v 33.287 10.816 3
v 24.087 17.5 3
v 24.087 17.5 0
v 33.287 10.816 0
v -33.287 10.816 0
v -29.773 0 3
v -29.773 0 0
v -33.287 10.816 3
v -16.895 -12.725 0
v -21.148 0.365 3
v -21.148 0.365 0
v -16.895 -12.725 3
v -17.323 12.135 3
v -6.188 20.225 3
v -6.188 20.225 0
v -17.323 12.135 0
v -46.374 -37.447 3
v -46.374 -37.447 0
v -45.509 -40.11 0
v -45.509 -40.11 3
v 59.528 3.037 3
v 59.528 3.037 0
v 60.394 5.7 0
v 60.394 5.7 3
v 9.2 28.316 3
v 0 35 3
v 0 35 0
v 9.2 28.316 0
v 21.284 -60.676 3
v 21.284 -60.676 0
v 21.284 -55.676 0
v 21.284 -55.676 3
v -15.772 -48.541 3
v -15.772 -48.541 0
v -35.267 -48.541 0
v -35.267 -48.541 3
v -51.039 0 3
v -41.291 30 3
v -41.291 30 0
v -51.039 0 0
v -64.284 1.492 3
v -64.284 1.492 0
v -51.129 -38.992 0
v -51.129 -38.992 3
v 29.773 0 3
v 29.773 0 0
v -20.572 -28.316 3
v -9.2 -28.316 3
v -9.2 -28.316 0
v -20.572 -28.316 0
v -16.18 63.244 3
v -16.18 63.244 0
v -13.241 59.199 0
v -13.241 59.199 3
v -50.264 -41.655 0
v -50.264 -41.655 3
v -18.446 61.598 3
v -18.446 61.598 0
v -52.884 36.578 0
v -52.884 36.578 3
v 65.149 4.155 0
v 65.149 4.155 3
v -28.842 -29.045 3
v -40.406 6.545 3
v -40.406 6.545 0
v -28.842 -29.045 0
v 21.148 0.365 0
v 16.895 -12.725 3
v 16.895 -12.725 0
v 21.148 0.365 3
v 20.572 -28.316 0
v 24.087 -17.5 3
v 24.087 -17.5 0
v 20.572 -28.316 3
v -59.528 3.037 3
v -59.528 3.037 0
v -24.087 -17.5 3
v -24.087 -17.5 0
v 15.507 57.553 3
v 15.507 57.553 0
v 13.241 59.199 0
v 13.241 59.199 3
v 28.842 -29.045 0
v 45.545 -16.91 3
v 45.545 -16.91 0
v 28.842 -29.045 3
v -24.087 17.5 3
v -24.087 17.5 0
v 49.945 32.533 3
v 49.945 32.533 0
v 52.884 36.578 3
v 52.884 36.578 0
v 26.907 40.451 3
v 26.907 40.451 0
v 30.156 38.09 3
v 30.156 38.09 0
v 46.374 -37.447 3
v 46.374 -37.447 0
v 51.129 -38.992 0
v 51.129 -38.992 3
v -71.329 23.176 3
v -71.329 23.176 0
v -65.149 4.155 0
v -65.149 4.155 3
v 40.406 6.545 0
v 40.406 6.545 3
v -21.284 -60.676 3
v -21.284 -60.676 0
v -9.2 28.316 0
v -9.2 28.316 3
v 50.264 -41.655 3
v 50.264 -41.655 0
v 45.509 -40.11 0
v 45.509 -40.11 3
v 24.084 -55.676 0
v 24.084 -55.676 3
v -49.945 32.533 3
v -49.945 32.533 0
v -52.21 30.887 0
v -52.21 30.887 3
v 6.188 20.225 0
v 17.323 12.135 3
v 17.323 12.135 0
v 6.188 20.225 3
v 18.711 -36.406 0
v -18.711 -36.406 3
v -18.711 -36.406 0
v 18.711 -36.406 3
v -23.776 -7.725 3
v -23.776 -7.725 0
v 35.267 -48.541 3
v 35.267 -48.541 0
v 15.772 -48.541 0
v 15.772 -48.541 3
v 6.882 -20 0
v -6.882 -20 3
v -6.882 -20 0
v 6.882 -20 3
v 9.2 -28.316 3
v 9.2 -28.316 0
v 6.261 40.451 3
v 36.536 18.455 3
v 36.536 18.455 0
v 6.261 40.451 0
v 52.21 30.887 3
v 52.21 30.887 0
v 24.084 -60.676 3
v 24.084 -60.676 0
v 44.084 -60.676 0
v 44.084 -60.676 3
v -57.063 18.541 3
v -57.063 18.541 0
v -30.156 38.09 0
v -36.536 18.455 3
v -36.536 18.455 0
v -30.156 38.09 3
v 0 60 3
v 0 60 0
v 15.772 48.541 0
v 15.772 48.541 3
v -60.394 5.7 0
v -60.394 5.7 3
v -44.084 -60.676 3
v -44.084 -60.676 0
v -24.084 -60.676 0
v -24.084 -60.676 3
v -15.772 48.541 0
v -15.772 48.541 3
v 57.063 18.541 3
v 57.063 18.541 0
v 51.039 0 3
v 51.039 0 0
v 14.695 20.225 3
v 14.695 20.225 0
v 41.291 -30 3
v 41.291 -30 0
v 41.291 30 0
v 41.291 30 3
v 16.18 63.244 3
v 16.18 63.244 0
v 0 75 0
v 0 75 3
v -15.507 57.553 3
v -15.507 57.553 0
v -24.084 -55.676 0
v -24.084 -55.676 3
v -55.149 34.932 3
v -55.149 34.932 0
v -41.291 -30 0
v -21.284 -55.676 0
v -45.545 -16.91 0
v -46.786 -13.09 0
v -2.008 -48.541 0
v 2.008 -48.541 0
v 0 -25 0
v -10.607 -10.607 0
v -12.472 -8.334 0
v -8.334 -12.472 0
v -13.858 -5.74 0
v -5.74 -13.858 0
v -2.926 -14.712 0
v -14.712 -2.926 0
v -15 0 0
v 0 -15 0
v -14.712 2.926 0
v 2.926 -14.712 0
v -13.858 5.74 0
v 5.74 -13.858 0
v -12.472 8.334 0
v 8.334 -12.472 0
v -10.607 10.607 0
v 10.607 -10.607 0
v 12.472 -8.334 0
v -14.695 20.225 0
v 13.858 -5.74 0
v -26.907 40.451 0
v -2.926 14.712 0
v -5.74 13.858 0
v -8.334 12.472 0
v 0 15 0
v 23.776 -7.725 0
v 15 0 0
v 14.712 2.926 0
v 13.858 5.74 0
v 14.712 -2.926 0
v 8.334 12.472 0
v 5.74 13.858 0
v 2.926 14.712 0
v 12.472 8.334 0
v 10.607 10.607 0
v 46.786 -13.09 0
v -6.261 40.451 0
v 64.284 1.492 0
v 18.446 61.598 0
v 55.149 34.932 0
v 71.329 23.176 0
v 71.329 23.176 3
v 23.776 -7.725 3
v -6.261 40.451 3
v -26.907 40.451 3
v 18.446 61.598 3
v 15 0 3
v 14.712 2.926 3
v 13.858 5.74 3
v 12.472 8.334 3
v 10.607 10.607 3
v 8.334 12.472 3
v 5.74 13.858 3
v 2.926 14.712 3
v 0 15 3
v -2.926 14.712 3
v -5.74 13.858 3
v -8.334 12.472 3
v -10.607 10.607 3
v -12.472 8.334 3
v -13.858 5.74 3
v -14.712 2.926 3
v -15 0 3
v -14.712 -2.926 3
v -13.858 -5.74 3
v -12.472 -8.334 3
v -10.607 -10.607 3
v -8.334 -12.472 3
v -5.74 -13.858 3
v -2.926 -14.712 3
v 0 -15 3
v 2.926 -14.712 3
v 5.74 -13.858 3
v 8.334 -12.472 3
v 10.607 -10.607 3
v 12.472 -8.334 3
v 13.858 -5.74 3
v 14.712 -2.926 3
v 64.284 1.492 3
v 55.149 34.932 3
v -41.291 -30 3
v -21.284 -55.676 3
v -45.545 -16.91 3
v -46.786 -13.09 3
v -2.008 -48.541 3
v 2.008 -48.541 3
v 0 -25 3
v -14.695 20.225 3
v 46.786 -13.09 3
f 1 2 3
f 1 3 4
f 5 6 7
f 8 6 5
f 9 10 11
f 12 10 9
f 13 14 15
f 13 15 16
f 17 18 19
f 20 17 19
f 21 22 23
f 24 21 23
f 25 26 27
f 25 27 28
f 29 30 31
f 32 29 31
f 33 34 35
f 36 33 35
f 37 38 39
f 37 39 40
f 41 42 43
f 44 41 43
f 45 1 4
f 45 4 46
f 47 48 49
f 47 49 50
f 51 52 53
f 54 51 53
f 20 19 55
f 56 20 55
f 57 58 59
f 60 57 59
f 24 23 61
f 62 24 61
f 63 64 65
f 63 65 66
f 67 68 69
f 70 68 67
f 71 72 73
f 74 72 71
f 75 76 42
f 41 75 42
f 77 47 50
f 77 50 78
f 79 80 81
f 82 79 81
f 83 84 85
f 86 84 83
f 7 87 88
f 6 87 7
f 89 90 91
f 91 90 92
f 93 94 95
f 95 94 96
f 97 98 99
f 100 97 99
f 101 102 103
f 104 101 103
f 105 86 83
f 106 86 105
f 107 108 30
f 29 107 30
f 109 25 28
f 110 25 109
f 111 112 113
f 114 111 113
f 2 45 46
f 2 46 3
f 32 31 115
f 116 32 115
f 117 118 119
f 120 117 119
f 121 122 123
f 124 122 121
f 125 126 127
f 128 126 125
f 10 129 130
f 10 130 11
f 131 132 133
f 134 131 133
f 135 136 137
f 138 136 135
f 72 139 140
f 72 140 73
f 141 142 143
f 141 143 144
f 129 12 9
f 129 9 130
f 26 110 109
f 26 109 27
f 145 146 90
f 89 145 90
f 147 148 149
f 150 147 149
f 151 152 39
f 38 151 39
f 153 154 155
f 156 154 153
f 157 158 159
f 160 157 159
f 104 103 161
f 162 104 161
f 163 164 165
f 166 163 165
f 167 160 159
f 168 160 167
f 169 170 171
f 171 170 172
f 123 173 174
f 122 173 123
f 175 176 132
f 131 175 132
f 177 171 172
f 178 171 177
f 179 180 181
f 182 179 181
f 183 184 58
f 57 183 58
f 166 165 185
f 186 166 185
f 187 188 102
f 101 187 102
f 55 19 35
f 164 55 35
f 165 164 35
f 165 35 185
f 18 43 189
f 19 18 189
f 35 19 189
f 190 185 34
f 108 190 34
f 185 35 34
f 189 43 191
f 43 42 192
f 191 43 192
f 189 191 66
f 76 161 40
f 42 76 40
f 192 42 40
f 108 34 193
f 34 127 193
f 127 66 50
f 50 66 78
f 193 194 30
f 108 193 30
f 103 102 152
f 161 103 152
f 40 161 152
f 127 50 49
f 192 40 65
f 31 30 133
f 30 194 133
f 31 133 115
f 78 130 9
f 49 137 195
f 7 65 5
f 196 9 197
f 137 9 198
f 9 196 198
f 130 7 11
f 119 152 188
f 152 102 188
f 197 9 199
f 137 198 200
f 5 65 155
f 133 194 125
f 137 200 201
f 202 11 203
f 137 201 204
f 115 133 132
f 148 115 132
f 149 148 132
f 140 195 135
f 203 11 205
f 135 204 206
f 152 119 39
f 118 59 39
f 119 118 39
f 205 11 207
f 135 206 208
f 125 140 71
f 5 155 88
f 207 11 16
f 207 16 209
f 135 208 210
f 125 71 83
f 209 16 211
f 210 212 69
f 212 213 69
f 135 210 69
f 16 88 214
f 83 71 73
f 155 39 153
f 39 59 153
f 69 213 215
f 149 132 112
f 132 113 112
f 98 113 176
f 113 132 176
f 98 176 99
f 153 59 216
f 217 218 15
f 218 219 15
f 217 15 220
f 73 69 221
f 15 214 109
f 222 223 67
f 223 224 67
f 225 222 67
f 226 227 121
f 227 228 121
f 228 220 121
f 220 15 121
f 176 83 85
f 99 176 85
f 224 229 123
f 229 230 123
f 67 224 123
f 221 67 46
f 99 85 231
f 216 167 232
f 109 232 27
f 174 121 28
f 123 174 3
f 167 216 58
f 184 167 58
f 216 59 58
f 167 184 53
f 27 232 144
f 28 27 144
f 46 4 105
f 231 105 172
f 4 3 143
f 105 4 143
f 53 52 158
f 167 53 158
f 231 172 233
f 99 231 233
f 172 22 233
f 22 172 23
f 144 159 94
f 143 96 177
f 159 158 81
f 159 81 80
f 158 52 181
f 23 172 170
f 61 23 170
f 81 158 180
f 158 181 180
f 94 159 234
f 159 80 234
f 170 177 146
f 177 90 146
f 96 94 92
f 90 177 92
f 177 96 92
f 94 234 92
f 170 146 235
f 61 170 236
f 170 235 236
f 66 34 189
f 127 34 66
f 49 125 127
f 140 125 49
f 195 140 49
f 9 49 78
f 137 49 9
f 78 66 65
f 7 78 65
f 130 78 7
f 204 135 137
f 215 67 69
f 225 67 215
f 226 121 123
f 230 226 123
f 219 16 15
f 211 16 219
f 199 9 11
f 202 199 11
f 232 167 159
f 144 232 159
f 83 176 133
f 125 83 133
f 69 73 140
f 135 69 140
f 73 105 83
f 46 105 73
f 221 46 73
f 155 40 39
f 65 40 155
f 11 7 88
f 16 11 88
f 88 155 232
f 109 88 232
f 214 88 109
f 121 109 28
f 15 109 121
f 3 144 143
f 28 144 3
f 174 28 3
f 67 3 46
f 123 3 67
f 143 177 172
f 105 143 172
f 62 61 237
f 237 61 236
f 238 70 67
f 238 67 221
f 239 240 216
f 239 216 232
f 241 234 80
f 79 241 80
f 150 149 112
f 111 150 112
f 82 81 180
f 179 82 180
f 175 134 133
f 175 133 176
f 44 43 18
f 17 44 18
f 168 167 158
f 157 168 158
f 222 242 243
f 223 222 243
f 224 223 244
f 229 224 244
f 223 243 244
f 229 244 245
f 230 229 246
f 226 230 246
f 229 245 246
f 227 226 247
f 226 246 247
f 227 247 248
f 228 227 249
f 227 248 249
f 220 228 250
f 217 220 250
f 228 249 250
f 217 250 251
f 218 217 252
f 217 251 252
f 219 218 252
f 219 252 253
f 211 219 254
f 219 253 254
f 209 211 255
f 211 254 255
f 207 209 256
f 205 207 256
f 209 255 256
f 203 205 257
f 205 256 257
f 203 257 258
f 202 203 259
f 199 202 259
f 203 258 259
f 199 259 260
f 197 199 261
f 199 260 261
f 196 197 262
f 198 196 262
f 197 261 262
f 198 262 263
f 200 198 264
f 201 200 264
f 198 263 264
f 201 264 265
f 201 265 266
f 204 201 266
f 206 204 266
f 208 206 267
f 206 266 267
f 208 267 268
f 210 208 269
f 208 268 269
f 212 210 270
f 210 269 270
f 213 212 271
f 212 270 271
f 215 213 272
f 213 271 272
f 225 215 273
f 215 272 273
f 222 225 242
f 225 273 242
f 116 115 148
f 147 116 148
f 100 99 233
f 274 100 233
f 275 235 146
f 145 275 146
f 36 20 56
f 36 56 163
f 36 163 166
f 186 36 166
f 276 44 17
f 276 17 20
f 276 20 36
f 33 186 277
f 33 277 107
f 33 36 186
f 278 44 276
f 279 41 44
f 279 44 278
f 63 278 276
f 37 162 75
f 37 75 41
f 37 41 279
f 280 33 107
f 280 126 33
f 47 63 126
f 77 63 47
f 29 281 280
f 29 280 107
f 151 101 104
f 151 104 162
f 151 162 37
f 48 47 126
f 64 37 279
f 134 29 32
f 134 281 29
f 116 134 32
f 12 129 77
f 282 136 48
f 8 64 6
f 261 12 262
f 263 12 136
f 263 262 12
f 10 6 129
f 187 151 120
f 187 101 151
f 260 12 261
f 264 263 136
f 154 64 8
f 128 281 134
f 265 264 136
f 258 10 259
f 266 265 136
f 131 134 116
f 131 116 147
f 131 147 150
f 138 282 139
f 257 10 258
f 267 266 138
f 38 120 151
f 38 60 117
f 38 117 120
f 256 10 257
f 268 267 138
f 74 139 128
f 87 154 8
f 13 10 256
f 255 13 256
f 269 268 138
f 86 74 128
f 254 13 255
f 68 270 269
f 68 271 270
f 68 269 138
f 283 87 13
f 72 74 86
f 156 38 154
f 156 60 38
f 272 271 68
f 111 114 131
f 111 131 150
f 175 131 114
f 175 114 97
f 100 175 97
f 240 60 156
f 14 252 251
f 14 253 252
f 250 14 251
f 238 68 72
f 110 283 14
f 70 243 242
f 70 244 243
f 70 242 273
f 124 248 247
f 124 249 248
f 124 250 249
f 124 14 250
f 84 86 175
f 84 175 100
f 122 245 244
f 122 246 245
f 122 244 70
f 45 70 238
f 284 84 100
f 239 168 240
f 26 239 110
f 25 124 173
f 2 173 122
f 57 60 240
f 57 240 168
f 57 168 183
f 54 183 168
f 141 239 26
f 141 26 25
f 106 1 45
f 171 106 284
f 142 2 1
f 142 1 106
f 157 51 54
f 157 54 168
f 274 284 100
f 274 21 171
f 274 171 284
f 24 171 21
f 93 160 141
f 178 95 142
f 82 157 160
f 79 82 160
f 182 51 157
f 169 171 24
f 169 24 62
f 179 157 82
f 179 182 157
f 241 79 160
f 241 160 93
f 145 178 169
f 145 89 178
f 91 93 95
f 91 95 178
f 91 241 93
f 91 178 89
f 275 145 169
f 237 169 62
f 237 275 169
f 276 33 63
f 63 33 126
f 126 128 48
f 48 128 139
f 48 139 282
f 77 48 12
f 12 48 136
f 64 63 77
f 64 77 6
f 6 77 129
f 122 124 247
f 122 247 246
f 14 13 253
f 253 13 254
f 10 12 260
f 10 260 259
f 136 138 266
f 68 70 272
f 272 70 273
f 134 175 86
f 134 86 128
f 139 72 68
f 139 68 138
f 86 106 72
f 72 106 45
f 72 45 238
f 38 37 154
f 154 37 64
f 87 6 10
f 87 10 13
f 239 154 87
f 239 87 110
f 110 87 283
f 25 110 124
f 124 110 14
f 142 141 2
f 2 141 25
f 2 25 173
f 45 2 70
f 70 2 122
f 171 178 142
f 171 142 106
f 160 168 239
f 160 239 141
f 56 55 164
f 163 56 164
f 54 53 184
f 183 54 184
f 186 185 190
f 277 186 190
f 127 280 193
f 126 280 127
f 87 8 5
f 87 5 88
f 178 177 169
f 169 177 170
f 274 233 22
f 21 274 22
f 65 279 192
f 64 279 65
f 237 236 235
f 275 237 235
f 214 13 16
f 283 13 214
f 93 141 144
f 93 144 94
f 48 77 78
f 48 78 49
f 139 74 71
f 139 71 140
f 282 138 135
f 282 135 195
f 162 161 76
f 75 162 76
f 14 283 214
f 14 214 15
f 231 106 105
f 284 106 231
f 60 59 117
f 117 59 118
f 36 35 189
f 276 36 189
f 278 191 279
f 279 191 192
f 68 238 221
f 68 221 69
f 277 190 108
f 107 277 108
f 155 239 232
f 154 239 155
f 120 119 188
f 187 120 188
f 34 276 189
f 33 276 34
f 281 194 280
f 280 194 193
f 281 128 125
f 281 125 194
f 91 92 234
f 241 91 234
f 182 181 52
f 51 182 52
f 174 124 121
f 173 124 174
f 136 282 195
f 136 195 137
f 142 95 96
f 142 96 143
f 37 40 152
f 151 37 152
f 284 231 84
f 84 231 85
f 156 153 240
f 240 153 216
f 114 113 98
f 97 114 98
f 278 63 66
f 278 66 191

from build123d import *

# Parameters (mm, degrees)
F1_DEPTH = 3
F3_DEPTH = 3
F5_DEPTH = 3
F7_DEPTH = 3
F8_R     = 15
F9_DEPTH = 3


with BuildPart() as f1:
    # F0 (on Top) → F1 (new body)
    with BuildSketch(Plane.XY):
        Polygon((16.18034, 63.244295), (0, 75), (-16.18034, 63.244295), (-13.241414, 59.19921), (-15.506661, 57.553411), (-18.445587, 61.598496), (-52.883651, 36.577778), (-49.944725, 32.532693), (-52.209973, 30.886895), (-55.148899, 34.93198), (-71.329239, 23.176275), (-65.148899, 4.155144), (-60.393616, 5.700229), (-59.528369, 3.037271), (-64.283651, 1.492186), (-51.129481, -38.992186), (-46.374199, -37.447101), (-45.508951, -40.110059), (-50.264234, -41.655144), (-44.083894, -60.676275), (-24.083894, -60.676275), (-24.083894, -55.676275), (-21.283894, -55.676275), (-21.283894, -60.676275), (21.283894, -60.676275), (21.283894, -55.676275), (24.083894, -55.676275), (24.083894, -60.676275), (44.083894, -60.676275), (50.264234, -41.655144), (45.508951, -40.110059), (46.374199, -37.447101), (51.129481, -38.992186), (64.283651, 1.492186), (59.528369, 3.037271), (60.393616, 5.700229), (65.148899, 4.155144), (71.329239, 23.176275), (55.148899, 34.93198), (52.209973, 30.886895), (49.944725, 32.532693), (52.883651, 36.577778), (18.445587, 61.598496), (15.506661, 57.553411), (13.241414, 59.19921), align=None)
        Polygon((-57.063391, 18.54102), (0, 60), (57.063391, 18.54102), (35.267115, -48.54102), (-35.267115, -48.54102), align=None, mode=Mode.SUBTRACT)
    extrude(amount=F1_DEPTH)

    # F2 (on face) → F3 (join)
    with BuildSketch(Plane.XY.offset(3)):
        Polygon((-57.063391, -18.54102), (0, -60), (57.063391, -18.54102), (35.267115, 48.54102), (-35.267115, 48.54102), align=None)
        Polygon((47.552826, -15.45085), (0, -50), (-47.552826, -15.45085), (-29.389263, 40.45085), (29.389263, 40.45085), align=None, mode=Mode.SUBTRACT)
    extrude(amount=-F3_DEPTH)

    # F4 (on face) → F5 (join)
    with BuildSketch(Plane.XY.offset(3)):
        Polygon((42.797543, 13.905765), (0, 45), (-42.797543, 13.905765), (-26.450336, -36.405765), (26.450336, -36.405765), align=None)
        Polygon((-33.286978, 10.815595), (0, 35), (33.286978, 10.815595), (20.572484, -28.315595), (-20.572484, -28.315595), align=None, mode=Mode.SUBTRACT)
    extrude(amount=-F5_DEPTH)

    # F6 (on face) → F7 (join)
    with BuildSketch(Plane.XY.offset(3)):
        Polygon((-33.286978, -10.815595), (0, -35), (33.286978, -10.815595), (20.572484, 28.315595), (-20.572484, 28.315595), align=None)
        Polygon((23.776413, -7.725425), (0, -25), (-23.776413, -7.725425), (-14.694631, 20.225425), (14.694631, 20.225425), align=None, mode=Mode.SUBTRACT)
    extrude(amount=-F7_DEPTH)

    # F8 (on face) → F9 (join)
    with BuildSketch(Plane.XY.offset(3)):
        Polygon((-14.530851, -20), (14.530851, -20), (23.51141, 7.63932), (0, 24.72136), (-23.51141, 7.63932), align=None)
        Circle(F8_R, mode=Mode.SUBTRACT)
    extrude(amount=-F9_DEPTH)


solid = f1.part
